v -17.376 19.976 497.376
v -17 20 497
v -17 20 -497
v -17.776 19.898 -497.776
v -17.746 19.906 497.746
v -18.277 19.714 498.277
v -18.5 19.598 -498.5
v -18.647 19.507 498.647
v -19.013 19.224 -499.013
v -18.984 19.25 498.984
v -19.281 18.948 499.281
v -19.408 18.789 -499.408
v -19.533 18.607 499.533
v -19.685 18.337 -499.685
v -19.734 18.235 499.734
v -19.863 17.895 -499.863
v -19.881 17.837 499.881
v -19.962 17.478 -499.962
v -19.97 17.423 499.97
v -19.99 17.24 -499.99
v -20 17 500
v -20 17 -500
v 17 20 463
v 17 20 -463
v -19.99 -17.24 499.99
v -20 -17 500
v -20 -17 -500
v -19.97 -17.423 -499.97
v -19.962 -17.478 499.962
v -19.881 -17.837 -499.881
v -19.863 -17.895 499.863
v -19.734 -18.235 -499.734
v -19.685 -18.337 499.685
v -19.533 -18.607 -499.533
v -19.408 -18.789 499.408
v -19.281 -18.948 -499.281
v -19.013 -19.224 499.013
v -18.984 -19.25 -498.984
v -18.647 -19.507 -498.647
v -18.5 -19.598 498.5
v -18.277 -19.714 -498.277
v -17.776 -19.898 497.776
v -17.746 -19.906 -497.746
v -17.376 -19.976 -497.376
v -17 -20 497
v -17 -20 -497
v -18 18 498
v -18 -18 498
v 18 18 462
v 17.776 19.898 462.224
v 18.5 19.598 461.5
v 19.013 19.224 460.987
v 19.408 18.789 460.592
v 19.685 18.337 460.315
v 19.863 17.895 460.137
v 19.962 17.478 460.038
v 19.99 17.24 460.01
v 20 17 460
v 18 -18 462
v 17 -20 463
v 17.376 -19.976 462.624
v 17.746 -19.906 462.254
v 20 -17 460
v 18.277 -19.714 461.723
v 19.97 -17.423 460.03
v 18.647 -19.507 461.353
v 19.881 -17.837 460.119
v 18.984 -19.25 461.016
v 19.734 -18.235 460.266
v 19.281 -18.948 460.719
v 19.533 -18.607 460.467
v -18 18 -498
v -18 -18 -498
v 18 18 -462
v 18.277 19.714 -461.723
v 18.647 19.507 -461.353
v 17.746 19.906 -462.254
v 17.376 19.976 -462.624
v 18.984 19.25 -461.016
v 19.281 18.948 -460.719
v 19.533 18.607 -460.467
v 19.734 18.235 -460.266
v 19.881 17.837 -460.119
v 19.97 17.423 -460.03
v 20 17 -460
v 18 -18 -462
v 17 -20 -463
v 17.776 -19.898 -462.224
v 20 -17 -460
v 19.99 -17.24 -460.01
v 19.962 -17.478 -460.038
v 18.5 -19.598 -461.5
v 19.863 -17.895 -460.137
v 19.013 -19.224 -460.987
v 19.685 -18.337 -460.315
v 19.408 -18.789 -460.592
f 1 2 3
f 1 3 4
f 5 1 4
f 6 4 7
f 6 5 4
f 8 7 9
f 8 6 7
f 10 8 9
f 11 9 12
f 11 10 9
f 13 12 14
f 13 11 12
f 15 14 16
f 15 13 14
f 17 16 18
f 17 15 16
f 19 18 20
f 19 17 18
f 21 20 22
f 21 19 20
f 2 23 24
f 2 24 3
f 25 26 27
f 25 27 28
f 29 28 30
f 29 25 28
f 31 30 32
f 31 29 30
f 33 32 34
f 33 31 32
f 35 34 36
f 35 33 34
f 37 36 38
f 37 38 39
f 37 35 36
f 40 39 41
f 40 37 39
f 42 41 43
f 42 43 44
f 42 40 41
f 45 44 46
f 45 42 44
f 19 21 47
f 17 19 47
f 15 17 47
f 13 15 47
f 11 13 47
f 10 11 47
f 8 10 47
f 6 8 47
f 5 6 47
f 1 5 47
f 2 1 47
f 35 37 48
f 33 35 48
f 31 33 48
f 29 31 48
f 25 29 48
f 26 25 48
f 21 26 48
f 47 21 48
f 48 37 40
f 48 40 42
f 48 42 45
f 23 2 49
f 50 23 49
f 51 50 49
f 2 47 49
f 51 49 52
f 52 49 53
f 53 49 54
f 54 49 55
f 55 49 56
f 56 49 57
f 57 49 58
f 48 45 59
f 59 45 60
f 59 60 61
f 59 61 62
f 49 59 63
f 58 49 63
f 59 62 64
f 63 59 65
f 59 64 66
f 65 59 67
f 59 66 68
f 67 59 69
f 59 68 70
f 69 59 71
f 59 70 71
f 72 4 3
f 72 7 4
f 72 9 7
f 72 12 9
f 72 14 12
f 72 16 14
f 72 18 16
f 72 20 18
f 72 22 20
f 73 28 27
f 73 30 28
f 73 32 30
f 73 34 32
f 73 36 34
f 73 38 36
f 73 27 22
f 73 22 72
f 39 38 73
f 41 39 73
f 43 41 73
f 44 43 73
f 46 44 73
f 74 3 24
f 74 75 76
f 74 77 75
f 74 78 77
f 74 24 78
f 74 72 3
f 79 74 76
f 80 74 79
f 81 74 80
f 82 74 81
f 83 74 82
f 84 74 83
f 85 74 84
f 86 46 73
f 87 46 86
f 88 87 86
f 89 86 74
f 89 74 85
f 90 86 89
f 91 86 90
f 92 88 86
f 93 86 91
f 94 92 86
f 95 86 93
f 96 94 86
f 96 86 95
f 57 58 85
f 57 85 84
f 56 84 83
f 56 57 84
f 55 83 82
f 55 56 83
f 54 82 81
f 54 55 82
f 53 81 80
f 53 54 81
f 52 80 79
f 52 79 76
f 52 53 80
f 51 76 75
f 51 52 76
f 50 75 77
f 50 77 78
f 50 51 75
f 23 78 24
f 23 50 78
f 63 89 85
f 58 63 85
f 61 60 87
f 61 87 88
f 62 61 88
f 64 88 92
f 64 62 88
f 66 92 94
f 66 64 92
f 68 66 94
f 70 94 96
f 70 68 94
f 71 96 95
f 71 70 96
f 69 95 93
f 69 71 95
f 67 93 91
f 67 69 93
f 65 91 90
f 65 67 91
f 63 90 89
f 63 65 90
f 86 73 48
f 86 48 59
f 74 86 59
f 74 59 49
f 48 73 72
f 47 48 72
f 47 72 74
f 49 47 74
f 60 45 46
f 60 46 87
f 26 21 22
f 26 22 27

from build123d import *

# Parameters (mm, degrees)
F0_W     = 36
F0_H     = 36
F1_DEPTH = 500
F3_DEPTH = 40.001


# Not quite as in the source:
# - a pattern or mirror of a feature is missing from the dataset's text; its kind, count and spacing are read off the source's solid


with BuildPart() as f1:
    # F0 (on Top) → F1 (new body, symmetric)
    with BuildSketch(Plane.XY):
        with BuildLine():
            Line((17, 20), (-17, 20))
            ThreePointArc((-17, 20), (-19.1213203436, 19.1213203436), (-20, 17))
            Line((-20, 17), (-20, -17))
            ThreePointArc((-20, -17), (-19.1213203436, -19.1213203436), (-17, -20))
            Line((-17, -20), (17, -20))
            ThreePointArc((17, -20), (19.1213203436, -19.1213203436), (20, -17))
            Line((20, -17), (20, 17))
            ThreePointArc((20, 17), (19.1213203436, 19.1213203436), (17, 20))
        make_face()
        Rectangle(F0_W, F0_H, mode=Mode.SUBTRACT)
    extrude(amount=F1_DEPTH, both=True)

    # F2 (on face) → F3 (cut, through all)
    with BuildSketch(Plane.XZ.offset(20)):
        Polygon((20, 500), (-20, 500), (20, 460), align=None)
    f3 = extrude(amount=-F3_DEPTH, mode=Mode.SUBTRACT)

    # F3_copies: F3 across plane
    add(f3.mirror(Plane(origin=(0, 0, 0), x_dir=(-1, 0, 0), z_dir=(0, 0, -1))), mode=Mode.SUBTRACT)


solid = f1.part
